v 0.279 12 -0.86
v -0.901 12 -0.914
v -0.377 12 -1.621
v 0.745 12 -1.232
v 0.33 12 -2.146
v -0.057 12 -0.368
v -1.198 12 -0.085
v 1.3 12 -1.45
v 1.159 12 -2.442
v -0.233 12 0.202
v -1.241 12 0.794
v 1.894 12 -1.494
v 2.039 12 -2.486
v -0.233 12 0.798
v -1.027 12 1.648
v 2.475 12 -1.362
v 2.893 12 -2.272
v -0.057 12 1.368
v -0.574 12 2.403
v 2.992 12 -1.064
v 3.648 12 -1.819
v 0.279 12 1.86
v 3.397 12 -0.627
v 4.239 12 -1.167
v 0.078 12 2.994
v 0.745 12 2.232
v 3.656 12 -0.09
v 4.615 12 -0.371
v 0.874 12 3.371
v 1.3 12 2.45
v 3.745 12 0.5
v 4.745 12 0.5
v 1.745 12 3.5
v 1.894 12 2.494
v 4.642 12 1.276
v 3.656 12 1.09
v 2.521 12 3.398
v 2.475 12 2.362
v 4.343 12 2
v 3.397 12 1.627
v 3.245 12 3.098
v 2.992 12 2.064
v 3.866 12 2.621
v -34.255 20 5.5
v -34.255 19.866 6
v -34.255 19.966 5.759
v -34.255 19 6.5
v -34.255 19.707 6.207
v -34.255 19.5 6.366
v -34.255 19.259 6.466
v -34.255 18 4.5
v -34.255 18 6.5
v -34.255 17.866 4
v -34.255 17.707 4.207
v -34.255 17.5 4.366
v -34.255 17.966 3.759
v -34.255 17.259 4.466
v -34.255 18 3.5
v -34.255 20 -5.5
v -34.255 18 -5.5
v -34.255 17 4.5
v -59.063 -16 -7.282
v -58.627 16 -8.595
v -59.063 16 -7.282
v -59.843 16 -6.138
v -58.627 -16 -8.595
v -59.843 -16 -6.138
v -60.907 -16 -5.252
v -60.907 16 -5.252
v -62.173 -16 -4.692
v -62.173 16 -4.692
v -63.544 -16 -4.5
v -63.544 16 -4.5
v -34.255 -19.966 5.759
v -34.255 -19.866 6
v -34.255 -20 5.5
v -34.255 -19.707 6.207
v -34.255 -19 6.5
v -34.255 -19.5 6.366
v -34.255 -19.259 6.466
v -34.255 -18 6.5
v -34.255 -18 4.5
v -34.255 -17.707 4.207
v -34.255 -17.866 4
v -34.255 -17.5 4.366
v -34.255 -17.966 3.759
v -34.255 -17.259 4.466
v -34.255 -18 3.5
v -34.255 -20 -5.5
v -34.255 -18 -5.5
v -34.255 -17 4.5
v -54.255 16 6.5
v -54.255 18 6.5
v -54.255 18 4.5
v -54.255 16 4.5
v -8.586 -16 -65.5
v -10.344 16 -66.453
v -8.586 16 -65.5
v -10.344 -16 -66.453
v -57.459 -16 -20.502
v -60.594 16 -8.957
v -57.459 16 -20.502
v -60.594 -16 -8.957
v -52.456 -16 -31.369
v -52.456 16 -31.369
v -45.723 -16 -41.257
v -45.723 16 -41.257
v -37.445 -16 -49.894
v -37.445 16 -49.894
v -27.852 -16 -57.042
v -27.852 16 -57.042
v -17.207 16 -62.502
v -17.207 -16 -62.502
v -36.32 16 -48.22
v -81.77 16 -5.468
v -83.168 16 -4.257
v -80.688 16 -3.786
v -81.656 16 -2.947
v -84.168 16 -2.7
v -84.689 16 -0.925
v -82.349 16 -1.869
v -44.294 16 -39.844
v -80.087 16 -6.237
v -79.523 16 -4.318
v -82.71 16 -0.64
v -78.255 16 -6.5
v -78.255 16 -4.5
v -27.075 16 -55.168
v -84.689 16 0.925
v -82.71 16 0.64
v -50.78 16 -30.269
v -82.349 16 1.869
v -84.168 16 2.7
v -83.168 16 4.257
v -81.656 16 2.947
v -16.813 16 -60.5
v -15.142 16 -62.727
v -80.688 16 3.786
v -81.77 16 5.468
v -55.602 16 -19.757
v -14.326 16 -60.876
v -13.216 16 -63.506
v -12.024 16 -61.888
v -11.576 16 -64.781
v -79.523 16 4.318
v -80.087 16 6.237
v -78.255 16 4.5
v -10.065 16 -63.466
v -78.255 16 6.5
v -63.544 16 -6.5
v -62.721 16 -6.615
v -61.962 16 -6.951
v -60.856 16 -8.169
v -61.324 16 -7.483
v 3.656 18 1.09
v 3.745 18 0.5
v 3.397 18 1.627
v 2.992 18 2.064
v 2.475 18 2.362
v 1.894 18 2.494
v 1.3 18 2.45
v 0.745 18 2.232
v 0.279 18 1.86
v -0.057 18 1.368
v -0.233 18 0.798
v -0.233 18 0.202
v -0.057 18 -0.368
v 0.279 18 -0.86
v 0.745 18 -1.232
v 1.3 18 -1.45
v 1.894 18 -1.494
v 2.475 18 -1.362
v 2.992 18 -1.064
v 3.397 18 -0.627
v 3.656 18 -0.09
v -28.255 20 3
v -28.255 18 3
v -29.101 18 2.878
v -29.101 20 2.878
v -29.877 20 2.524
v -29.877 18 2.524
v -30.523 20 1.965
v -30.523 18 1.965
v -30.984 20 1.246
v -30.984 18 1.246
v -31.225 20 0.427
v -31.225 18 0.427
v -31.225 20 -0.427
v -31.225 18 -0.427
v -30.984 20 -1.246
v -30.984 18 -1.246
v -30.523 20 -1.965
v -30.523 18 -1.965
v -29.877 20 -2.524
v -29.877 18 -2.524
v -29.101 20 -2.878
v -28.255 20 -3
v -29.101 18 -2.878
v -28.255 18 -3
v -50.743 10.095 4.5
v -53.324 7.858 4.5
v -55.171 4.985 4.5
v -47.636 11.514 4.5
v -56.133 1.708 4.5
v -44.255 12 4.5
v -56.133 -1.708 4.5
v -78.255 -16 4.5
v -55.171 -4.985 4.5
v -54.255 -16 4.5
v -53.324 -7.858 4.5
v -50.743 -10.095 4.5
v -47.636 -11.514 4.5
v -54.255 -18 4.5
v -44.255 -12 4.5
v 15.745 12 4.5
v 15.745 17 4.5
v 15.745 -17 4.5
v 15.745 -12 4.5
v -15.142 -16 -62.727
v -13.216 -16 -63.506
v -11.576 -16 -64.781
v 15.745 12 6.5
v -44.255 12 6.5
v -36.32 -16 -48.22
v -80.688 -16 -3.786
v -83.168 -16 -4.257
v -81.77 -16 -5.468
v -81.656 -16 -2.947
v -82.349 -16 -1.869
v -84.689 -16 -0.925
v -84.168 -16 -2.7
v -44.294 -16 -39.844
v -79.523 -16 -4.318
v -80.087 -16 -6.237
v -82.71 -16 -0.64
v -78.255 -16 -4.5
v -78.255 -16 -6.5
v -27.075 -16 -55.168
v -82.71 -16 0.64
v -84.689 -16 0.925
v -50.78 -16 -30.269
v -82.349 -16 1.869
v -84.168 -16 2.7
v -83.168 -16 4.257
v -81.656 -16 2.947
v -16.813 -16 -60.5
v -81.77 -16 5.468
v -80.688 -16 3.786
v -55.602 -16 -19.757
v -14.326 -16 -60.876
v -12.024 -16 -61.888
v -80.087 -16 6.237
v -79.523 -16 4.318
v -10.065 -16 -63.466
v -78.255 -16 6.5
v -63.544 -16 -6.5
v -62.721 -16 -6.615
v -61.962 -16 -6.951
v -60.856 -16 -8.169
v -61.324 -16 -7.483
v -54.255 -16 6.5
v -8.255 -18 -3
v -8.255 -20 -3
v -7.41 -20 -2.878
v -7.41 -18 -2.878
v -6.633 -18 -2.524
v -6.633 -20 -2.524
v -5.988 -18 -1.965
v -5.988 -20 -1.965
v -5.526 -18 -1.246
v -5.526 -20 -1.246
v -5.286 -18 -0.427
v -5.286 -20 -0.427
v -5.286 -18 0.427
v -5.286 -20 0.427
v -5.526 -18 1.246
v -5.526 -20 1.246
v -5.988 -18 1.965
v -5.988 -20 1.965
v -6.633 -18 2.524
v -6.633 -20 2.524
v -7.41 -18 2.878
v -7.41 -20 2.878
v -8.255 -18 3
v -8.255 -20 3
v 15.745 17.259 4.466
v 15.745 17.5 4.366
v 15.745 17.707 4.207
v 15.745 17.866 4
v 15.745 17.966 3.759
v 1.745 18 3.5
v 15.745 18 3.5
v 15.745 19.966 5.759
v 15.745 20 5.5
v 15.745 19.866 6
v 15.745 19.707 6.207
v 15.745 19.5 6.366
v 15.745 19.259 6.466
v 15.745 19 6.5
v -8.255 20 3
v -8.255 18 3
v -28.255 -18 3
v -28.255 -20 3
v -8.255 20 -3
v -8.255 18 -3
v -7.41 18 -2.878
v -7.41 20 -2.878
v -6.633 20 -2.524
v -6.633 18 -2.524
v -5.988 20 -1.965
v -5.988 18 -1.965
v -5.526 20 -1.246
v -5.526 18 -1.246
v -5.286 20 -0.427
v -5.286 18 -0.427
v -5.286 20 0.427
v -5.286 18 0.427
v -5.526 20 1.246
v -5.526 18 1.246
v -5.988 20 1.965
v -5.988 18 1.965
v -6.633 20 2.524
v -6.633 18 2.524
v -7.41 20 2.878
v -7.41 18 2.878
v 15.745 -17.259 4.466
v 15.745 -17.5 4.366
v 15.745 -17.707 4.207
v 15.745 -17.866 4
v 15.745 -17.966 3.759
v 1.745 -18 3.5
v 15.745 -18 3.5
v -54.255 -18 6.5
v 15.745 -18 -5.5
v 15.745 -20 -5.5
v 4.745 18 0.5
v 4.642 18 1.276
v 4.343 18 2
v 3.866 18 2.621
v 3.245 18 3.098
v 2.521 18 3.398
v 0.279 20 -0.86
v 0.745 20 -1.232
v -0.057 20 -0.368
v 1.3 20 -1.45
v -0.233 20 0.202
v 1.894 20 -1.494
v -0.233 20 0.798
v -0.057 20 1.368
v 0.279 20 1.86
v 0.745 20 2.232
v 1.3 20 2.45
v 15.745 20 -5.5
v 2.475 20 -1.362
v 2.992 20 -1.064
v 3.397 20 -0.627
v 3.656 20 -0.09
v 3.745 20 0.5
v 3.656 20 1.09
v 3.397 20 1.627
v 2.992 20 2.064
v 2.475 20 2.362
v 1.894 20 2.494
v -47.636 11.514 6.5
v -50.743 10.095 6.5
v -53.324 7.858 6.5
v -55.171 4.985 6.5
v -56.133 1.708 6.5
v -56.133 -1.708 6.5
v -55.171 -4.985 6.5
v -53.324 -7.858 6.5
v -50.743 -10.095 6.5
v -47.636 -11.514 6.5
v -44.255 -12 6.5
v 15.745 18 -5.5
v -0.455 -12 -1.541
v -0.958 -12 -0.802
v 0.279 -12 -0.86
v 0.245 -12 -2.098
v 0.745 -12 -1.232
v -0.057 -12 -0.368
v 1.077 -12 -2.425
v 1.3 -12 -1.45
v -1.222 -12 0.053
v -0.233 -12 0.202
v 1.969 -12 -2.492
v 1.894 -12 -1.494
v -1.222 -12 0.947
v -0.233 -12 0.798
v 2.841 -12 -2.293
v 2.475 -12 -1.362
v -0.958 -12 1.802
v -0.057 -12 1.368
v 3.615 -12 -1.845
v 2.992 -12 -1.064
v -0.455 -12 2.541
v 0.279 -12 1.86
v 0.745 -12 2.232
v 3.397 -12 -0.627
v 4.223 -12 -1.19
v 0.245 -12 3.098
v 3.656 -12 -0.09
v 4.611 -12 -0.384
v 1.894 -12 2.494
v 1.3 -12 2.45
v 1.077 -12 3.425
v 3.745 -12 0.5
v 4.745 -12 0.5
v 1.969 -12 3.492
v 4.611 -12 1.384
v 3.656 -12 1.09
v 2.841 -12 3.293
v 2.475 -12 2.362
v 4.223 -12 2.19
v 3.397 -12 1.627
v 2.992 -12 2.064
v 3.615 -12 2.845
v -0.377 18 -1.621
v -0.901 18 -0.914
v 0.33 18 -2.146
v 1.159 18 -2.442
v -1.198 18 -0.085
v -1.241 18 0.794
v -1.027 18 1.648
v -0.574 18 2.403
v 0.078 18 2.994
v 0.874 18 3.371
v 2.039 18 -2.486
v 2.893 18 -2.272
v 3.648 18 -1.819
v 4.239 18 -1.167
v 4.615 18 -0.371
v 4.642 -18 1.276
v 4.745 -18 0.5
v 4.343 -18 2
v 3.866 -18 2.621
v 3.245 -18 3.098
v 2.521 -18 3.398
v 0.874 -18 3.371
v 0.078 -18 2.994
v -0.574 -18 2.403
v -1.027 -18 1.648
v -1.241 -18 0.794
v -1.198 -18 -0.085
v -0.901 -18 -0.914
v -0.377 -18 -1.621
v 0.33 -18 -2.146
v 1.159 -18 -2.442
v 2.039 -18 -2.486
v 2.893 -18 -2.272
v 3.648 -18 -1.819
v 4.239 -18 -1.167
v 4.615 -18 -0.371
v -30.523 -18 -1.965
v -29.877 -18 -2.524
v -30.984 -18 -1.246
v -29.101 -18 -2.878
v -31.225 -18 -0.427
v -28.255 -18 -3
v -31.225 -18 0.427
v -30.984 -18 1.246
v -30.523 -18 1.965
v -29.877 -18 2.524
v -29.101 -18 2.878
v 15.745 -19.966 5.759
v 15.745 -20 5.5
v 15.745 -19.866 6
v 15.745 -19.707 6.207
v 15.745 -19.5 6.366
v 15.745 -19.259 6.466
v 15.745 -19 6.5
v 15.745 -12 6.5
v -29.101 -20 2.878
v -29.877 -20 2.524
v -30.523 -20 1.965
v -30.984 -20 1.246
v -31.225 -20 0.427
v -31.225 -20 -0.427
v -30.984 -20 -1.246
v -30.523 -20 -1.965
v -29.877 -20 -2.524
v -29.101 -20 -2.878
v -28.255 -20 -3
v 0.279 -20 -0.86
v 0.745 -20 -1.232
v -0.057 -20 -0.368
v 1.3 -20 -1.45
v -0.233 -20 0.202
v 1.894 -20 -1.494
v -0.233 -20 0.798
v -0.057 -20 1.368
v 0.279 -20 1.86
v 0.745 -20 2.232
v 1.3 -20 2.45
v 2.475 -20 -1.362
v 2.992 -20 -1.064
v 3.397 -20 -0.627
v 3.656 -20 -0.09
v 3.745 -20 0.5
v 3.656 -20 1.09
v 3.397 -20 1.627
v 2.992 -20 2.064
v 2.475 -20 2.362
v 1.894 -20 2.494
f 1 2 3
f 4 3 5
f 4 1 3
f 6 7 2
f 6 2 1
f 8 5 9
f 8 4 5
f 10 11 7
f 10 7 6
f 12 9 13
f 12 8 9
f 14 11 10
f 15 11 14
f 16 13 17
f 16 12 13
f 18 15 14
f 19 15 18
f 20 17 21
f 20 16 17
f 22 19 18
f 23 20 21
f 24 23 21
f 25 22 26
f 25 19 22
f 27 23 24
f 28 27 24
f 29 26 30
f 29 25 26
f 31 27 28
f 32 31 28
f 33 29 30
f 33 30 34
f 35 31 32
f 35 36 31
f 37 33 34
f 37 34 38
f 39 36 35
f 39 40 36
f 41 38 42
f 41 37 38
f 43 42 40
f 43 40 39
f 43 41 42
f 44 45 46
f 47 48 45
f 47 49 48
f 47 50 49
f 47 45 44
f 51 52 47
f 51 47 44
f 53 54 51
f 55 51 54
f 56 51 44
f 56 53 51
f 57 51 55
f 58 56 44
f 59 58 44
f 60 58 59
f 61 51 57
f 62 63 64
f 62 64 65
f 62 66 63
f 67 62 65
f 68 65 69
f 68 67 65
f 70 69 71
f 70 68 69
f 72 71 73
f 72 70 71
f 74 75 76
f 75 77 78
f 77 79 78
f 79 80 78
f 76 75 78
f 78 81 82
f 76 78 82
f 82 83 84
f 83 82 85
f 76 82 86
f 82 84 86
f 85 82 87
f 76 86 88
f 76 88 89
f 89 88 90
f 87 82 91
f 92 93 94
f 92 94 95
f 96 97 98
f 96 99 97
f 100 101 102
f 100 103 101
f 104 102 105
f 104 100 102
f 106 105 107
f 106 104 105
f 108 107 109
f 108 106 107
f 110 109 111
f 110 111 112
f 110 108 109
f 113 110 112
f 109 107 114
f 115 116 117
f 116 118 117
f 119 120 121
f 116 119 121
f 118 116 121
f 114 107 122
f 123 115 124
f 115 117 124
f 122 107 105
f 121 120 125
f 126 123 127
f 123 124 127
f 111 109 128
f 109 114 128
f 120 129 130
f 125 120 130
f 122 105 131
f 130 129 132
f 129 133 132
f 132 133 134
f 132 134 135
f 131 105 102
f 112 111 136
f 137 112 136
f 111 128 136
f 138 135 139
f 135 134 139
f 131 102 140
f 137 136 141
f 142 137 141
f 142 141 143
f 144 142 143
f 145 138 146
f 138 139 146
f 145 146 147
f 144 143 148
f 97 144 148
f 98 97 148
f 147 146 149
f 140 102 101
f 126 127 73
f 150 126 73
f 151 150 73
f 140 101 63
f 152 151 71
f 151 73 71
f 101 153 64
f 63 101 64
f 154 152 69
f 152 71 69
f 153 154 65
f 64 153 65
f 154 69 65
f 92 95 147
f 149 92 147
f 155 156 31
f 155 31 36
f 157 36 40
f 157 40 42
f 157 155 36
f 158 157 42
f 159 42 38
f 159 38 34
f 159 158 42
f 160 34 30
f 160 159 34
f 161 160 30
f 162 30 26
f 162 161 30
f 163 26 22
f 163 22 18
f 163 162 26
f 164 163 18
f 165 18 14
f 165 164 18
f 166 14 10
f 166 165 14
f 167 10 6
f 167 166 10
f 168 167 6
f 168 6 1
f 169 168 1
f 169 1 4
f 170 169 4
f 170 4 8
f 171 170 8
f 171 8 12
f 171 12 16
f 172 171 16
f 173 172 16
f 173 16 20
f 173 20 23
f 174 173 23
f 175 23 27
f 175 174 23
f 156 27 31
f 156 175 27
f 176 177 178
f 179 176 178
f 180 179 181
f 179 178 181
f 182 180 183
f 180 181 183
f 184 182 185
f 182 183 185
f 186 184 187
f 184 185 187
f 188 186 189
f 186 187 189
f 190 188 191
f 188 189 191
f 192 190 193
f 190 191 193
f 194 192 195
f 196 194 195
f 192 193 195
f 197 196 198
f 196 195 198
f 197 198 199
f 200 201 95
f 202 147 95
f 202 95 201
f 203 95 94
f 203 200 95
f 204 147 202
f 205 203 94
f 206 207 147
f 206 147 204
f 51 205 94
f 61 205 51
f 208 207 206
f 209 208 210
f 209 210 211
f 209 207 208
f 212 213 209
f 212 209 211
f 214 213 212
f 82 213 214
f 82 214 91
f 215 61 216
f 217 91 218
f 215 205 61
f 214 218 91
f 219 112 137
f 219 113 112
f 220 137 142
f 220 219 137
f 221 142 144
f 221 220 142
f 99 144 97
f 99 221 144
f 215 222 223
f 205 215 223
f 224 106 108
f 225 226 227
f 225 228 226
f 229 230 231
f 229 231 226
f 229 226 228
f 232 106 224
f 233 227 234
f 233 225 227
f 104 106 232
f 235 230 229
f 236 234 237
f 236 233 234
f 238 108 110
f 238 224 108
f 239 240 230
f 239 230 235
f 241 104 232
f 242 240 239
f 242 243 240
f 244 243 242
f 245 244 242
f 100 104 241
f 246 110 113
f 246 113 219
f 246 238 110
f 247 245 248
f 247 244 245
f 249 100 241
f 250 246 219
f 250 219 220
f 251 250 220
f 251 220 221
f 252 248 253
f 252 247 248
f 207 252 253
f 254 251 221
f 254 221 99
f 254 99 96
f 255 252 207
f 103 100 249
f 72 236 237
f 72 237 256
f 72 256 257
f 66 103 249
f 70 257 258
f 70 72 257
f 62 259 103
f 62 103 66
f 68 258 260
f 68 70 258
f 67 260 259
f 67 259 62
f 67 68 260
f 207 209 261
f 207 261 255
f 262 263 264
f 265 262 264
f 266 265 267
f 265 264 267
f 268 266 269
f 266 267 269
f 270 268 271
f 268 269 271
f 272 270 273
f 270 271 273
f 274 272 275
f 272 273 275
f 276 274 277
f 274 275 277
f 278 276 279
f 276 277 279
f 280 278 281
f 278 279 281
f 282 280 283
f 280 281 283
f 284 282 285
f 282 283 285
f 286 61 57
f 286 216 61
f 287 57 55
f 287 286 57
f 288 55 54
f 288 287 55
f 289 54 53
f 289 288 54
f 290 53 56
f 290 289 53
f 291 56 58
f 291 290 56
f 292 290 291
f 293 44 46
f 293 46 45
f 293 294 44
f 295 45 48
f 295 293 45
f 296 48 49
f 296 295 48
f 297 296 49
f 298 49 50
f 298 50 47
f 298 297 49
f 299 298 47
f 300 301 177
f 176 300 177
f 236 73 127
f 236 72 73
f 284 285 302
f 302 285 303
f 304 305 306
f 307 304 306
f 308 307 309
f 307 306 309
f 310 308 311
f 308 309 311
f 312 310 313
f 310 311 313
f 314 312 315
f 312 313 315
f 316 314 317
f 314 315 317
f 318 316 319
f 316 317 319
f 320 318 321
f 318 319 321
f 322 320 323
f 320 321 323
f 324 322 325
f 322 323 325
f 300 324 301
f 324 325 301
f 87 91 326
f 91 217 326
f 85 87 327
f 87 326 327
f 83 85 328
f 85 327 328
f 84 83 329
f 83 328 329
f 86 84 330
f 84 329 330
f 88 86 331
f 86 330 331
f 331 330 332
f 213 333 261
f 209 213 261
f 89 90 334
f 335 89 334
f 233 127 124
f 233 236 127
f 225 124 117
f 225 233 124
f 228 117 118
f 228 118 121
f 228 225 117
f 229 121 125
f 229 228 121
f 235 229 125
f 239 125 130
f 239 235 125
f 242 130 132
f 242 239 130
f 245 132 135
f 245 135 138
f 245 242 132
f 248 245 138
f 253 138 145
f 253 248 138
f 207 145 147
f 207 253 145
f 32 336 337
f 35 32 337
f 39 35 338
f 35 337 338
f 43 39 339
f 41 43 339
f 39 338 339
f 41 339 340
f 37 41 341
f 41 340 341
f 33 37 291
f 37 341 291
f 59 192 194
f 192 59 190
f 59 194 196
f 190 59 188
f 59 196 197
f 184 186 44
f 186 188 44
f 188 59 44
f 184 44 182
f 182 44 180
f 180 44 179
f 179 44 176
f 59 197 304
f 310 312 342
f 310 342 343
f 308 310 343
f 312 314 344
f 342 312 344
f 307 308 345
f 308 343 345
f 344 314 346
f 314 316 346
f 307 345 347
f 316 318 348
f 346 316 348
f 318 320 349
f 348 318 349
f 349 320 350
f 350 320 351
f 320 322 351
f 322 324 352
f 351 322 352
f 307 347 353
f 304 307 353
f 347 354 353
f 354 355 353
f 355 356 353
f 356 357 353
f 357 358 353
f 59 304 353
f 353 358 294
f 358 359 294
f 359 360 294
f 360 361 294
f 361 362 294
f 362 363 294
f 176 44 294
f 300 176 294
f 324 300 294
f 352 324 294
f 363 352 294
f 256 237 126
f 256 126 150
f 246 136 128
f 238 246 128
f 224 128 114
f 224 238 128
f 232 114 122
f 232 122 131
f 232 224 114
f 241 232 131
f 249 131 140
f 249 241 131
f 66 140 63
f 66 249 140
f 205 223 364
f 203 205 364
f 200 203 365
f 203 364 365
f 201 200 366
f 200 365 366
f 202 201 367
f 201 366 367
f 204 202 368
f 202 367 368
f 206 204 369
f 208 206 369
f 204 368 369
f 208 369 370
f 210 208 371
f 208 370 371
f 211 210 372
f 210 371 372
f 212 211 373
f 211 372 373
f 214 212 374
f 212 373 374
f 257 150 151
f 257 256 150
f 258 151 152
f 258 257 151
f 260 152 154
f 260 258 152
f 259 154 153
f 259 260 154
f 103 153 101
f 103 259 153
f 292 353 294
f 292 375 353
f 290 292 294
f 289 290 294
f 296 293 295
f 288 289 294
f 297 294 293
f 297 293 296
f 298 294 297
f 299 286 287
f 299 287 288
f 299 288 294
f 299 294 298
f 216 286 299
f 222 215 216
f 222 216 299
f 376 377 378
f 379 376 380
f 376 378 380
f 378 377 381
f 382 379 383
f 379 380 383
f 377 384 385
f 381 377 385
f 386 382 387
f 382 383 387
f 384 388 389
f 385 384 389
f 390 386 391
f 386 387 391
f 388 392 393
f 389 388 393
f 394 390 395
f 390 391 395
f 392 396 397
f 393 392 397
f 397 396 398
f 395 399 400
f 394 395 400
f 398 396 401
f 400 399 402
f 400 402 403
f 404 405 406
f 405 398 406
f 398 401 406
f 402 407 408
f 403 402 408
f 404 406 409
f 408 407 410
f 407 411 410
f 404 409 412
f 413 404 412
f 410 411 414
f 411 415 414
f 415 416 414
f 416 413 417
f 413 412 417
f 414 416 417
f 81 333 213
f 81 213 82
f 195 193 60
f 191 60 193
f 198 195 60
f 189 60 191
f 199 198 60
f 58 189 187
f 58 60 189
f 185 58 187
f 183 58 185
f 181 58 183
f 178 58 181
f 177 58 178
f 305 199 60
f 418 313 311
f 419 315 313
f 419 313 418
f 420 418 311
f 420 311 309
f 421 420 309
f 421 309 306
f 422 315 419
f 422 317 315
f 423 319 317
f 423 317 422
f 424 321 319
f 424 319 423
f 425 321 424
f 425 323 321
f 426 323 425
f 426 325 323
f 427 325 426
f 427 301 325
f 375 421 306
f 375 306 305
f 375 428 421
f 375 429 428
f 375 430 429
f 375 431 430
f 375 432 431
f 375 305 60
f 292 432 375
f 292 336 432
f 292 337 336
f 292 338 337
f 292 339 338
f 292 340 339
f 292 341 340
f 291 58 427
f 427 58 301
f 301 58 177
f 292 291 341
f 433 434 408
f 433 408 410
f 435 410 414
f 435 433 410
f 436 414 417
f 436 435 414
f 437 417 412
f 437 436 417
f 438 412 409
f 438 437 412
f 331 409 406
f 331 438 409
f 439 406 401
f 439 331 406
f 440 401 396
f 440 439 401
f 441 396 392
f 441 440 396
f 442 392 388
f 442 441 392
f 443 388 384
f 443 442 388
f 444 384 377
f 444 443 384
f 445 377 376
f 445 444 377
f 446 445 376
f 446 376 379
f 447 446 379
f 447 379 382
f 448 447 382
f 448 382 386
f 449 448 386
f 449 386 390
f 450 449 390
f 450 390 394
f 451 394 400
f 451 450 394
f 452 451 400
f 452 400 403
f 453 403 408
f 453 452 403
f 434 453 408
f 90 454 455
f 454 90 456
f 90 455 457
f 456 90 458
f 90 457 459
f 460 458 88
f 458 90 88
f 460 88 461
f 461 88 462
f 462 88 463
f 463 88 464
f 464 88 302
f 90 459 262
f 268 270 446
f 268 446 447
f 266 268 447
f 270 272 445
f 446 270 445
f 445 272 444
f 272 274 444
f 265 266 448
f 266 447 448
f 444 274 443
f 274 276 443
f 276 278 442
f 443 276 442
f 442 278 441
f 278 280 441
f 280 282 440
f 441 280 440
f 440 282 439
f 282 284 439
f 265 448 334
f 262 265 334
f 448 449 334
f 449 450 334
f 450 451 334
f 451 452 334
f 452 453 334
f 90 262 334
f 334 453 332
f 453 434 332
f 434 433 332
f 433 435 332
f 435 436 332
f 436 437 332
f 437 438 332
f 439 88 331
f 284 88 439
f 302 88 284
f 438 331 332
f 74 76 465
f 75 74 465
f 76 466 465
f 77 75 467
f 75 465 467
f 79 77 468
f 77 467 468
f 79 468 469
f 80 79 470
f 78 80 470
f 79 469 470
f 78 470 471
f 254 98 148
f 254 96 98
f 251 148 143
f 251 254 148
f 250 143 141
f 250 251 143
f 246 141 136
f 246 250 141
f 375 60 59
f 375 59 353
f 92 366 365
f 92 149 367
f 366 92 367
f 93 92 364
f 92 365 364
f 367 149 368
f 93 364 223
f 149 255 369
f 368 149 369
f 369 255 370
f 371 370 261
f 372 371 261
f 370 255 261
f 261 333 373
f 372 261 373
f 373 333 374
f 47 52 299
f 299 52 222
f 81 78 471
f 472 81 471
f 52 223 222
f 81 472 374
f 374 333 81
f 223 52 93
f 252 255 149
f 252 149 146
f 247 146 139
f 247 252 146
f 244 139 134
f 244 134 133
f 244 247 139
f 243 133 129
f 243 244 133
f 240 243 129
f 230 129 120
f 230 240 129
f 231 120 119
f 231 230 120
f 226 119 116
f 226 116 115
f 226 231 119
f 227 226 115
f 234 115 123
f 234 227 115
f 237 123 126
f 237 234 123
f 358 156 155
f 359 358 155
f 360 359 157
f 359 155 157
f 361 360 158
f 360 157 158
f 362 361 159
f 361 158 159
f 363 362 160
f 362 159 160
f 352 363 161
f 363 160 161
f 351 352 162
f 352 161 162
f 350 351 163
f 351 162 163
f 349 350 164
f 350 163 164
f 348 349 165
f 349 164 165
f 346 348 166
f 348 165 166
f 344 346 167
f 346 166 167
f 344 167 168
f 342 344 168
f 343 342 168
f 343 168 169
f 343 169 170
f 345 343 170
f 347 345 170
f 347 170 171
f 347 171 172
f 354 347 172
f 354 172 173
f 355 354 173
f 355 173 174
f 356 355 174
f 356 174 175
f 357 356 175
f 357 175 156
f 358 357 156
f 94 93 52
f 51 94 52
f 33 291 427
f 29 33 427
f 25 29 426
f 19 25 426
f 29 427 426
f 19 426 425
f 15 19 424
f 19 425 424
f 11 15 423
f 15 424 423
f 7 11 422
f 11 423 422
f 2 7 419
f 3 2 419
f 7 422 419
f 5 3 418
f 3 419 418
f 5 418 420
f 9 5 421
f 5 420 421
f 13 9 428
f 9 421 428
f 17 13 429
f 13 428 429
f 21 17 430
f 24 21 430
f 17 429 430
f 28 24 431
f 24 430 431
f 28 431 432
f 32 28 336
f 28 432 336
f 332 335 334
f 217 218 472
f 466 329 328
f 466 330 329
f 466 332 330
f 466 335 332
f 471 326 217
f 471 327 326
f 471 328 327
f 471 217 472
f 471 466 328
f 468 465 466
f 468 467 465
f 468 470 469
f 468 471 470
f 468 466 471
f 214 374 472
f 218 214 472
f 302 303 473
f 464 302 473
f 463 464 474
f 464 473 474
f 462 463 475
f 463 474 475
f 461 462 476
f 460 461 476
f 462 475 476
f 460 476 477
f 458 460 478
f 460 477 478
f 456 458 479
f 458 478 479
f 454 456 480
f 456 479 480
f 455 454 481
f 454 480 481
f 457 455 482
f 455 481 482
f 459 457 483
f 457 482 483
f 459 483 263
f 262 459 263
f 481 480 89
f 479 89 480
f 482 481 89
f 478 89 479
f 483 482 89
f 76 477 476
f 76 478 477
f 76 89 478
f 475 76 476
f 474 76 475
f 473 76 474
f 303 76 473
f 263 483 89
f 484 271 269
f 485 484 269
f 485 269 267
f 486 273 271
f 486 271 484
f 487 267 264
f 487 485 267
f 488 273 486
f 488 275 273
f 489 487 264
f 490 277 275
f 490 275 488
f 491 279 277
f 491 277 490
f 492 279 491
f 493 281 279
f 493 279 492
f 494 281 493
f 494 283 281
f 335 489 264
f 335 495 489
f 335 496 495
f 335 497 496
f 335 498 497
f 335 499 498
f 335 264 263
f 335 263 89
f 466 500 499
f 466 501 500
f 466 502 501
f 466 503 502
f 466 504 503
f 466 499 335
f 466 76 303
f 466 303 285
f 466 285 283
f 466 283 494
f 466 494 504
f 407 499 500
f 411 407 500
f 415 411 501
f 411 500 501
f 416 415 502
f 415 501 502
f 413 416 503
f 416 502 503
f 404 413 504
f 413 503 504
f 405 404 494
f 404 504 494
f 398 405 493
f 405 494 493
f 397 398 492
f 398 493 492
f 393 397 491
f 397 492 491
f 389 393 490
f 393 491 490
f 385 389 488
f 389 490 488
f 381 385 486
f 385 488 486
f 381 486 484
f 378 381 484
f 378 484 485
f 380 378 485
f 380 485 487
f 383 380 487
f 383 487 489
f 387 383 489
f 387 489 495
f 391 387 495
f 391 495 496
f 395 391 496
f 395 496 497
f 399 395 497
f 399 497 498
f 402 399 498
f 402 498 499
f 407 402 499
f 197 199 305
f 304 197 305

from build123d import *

# Parameters (mm, degrees)
F1_DEPTH  = 16
F2_W      = 70
F2_H      = 2
F3_DEPTH  = 2
F4_W      = 50
F4_H      = 10
F4_H_2    = 2
F5_DEPTH  = 2
F6_R      = 1
F9_DEPTH  = 2
F11_DEPTH = 40.001
F12_R     = 2
F13_DEPTH = 40.001
F12_R_2   = 3
F14_DEPTH = 8
F15_R     = 2
F16_DEPTH = 6


with BuildPart() as f1:
    # F0 (on Front) → F1 (new body)
    with BuildSketch(Plane.XZ):
        with BuildLine():
            ThreePointArc((-78.2553477167, -4.5), (-82.7553477167, 0), (-78.2553477167, 4.5))
            Line((-78.2553477167, 4.5), (15.7446522833, 4.5))
            Line((15.7446522833, 4.5), (15.7446522833, 6.5))
            Line((15.7446522833, 6.5), (-78.2553477167, 6.5))
            ThreePointArc((-78.2553477167, 6.5), (-84.7553477167, 0), (-78.2553477167, -6.5))
            Line((-78.2553477167, -6.5), (-63.5440570211, -6.5))
            ThreePointArc((-63.5440570211, -6.5), (-61.6242210154, -7.1947386892), (-60.5935745764, -8.9571801926))
            ThreePointArc((-60.5935745764, -8.9571801926), (-45.7228537684, -41.2574258057), (-17.207438999, -62.5016091164))
            ThreePointArc((-17.207438999, -62.5016091164), (-13.2164359403, -63.5063644425), (-10.3436688231, -66.4533710204))
            Line((-10.3436688231, -66.4533710204), (-8.58552102, -65.5))
            ThreePointArc((-8.58552102, -65.5), (-12.0235125852, -61.888485404), (-16.8125554919, -60.5))
            ThreePointArc((-16.8125554919, -60.5), (-44.2937887319, -39.8437899922), (-58.6265862799, -8.5953003211))
            ThreePointArc((-58.6265862799, -8.5953003211), (-60.3443303449, -5.6578978153), (-63.5440570211, -4.5))
            Line((-63.5440570211, -4.5), (-78.2553477167, -4.5))
        make_face()
    extrude(amount=F1_DEPTH)

    # F2 (on face) → F3 (join)
    with BuildSketch(Plane.XY.offset(6.5)):
        with Locations((-19.2553477167, -17)):
            Rectangle(F2_W, F2_H)
    extrude(amount=-F3_DEPTH)

    # F4 (on face) → F5 (join)
    with BuildSketch(Plane.XZ.offset(18)):
        with Locations((-9.2553477167, -0.5)):
            Rectangle(F4_W, F4_H)
        with Locations((-9.2553477167, 5.5)):
            Rectangle(F4_W, F4_H_2)
    extrude(amount=F5_DEPTH)

    # F6
    f6_edges = [f1.edges().sort_by_distance(p)[0] for p in [
        (-9.255348, -20, 6.5),
        (-9.255348, -18, 4.5),
    ]]
    fillet(f6_edges, radius=F6_R)

    # F7: F1 across face


with BuildPart() as f1_1:
    add(f1.part)
    add(f1.part.mirror(Plane(origin=(-41.9712348224, 0, -13.8038322502), x_dir=(1, 0, 0), z_dir=(0, 1, 0))))

    # F8 (on face) → F9 (cut)
    with BuildSketch(Plane.XY.offset(6.5)):
        with BuildLine():
            Line((15.7446522833, 12), (-44.2553477167, 12))
            ThreePointArc((-44.2553477167, 12), (-56.2553477167, 0), (-44.2553477167, -12))
            Line((-44.2553477167, -12), (15.7446522833, -12))
            Line((15.7446522833, -12), (15.7446522833, 12))
        make_face()
    extrude(amount=-F9_DEPTH, mode=Mode.SUBTRACT)

    # F10 (on face) → F11 (cut, through all)
    with BuildSketch(Plane.XZ.offset(20)):
        with BuildLine():
            ThreePointArc((-28.2553477167, 3), (-31.2553477167, 0), (-28.2553477167, -3))
            Line((-28.2553477167, -3), (-8.2553477167, -3))
            ThreePointArc((-8.2553477167, -3), (-5.2553477167, 0), (-8.2553477167, 3))
            Line((-8.2553477167, 3), (-28.2553477167, 3))
        make_face()
    extrude(amount=-F11_DEPTH, mode=Mode.SUBTRACT)

    # F12 (on face) → F13 (cut, through all)
    with BuildSketch(Plane.XZ.offset(20)):
        with Locations((1.7446522833, 0.5)):
            Circle(F12_R)
    extrude(amount=-F13_DEPTH, mode=Mode.SUBTRACT)

    # F12 (on face) → F14 (join)
    with BuildSketch(Plane.XZ.offset(20)):
        with Locations((1.7446522833, 0.5)):
            Circle(F12_R_2)
        with Locations((1.7446522833, 0.5)):
            Circle(F12_R, mode=Mode.SUBTRACT)
    extrude(amount=-F14_DEPTH)

    # F15 (on face) → F16 (join)
    with BuildSketch(Plane.XZ.offset(-18)):
        with BuildLine():
            ThreePointArc((1.7446522833, 3.5), (-0.3766680603, -1.6213203436), (4.7446522833, 0.5))
            ThreePointArc((4.7446522833, 0.5), (3.8659726268, 2.6213203436), (1.7446522833, 3.5))
        make_face()
        with Locations((1.7446522833, 0.5)):
            Circle(F15_R, mode=Mode.SUBTRACT)
    extrude(amount=F16_DEPTH)


solid = f1_1.part
